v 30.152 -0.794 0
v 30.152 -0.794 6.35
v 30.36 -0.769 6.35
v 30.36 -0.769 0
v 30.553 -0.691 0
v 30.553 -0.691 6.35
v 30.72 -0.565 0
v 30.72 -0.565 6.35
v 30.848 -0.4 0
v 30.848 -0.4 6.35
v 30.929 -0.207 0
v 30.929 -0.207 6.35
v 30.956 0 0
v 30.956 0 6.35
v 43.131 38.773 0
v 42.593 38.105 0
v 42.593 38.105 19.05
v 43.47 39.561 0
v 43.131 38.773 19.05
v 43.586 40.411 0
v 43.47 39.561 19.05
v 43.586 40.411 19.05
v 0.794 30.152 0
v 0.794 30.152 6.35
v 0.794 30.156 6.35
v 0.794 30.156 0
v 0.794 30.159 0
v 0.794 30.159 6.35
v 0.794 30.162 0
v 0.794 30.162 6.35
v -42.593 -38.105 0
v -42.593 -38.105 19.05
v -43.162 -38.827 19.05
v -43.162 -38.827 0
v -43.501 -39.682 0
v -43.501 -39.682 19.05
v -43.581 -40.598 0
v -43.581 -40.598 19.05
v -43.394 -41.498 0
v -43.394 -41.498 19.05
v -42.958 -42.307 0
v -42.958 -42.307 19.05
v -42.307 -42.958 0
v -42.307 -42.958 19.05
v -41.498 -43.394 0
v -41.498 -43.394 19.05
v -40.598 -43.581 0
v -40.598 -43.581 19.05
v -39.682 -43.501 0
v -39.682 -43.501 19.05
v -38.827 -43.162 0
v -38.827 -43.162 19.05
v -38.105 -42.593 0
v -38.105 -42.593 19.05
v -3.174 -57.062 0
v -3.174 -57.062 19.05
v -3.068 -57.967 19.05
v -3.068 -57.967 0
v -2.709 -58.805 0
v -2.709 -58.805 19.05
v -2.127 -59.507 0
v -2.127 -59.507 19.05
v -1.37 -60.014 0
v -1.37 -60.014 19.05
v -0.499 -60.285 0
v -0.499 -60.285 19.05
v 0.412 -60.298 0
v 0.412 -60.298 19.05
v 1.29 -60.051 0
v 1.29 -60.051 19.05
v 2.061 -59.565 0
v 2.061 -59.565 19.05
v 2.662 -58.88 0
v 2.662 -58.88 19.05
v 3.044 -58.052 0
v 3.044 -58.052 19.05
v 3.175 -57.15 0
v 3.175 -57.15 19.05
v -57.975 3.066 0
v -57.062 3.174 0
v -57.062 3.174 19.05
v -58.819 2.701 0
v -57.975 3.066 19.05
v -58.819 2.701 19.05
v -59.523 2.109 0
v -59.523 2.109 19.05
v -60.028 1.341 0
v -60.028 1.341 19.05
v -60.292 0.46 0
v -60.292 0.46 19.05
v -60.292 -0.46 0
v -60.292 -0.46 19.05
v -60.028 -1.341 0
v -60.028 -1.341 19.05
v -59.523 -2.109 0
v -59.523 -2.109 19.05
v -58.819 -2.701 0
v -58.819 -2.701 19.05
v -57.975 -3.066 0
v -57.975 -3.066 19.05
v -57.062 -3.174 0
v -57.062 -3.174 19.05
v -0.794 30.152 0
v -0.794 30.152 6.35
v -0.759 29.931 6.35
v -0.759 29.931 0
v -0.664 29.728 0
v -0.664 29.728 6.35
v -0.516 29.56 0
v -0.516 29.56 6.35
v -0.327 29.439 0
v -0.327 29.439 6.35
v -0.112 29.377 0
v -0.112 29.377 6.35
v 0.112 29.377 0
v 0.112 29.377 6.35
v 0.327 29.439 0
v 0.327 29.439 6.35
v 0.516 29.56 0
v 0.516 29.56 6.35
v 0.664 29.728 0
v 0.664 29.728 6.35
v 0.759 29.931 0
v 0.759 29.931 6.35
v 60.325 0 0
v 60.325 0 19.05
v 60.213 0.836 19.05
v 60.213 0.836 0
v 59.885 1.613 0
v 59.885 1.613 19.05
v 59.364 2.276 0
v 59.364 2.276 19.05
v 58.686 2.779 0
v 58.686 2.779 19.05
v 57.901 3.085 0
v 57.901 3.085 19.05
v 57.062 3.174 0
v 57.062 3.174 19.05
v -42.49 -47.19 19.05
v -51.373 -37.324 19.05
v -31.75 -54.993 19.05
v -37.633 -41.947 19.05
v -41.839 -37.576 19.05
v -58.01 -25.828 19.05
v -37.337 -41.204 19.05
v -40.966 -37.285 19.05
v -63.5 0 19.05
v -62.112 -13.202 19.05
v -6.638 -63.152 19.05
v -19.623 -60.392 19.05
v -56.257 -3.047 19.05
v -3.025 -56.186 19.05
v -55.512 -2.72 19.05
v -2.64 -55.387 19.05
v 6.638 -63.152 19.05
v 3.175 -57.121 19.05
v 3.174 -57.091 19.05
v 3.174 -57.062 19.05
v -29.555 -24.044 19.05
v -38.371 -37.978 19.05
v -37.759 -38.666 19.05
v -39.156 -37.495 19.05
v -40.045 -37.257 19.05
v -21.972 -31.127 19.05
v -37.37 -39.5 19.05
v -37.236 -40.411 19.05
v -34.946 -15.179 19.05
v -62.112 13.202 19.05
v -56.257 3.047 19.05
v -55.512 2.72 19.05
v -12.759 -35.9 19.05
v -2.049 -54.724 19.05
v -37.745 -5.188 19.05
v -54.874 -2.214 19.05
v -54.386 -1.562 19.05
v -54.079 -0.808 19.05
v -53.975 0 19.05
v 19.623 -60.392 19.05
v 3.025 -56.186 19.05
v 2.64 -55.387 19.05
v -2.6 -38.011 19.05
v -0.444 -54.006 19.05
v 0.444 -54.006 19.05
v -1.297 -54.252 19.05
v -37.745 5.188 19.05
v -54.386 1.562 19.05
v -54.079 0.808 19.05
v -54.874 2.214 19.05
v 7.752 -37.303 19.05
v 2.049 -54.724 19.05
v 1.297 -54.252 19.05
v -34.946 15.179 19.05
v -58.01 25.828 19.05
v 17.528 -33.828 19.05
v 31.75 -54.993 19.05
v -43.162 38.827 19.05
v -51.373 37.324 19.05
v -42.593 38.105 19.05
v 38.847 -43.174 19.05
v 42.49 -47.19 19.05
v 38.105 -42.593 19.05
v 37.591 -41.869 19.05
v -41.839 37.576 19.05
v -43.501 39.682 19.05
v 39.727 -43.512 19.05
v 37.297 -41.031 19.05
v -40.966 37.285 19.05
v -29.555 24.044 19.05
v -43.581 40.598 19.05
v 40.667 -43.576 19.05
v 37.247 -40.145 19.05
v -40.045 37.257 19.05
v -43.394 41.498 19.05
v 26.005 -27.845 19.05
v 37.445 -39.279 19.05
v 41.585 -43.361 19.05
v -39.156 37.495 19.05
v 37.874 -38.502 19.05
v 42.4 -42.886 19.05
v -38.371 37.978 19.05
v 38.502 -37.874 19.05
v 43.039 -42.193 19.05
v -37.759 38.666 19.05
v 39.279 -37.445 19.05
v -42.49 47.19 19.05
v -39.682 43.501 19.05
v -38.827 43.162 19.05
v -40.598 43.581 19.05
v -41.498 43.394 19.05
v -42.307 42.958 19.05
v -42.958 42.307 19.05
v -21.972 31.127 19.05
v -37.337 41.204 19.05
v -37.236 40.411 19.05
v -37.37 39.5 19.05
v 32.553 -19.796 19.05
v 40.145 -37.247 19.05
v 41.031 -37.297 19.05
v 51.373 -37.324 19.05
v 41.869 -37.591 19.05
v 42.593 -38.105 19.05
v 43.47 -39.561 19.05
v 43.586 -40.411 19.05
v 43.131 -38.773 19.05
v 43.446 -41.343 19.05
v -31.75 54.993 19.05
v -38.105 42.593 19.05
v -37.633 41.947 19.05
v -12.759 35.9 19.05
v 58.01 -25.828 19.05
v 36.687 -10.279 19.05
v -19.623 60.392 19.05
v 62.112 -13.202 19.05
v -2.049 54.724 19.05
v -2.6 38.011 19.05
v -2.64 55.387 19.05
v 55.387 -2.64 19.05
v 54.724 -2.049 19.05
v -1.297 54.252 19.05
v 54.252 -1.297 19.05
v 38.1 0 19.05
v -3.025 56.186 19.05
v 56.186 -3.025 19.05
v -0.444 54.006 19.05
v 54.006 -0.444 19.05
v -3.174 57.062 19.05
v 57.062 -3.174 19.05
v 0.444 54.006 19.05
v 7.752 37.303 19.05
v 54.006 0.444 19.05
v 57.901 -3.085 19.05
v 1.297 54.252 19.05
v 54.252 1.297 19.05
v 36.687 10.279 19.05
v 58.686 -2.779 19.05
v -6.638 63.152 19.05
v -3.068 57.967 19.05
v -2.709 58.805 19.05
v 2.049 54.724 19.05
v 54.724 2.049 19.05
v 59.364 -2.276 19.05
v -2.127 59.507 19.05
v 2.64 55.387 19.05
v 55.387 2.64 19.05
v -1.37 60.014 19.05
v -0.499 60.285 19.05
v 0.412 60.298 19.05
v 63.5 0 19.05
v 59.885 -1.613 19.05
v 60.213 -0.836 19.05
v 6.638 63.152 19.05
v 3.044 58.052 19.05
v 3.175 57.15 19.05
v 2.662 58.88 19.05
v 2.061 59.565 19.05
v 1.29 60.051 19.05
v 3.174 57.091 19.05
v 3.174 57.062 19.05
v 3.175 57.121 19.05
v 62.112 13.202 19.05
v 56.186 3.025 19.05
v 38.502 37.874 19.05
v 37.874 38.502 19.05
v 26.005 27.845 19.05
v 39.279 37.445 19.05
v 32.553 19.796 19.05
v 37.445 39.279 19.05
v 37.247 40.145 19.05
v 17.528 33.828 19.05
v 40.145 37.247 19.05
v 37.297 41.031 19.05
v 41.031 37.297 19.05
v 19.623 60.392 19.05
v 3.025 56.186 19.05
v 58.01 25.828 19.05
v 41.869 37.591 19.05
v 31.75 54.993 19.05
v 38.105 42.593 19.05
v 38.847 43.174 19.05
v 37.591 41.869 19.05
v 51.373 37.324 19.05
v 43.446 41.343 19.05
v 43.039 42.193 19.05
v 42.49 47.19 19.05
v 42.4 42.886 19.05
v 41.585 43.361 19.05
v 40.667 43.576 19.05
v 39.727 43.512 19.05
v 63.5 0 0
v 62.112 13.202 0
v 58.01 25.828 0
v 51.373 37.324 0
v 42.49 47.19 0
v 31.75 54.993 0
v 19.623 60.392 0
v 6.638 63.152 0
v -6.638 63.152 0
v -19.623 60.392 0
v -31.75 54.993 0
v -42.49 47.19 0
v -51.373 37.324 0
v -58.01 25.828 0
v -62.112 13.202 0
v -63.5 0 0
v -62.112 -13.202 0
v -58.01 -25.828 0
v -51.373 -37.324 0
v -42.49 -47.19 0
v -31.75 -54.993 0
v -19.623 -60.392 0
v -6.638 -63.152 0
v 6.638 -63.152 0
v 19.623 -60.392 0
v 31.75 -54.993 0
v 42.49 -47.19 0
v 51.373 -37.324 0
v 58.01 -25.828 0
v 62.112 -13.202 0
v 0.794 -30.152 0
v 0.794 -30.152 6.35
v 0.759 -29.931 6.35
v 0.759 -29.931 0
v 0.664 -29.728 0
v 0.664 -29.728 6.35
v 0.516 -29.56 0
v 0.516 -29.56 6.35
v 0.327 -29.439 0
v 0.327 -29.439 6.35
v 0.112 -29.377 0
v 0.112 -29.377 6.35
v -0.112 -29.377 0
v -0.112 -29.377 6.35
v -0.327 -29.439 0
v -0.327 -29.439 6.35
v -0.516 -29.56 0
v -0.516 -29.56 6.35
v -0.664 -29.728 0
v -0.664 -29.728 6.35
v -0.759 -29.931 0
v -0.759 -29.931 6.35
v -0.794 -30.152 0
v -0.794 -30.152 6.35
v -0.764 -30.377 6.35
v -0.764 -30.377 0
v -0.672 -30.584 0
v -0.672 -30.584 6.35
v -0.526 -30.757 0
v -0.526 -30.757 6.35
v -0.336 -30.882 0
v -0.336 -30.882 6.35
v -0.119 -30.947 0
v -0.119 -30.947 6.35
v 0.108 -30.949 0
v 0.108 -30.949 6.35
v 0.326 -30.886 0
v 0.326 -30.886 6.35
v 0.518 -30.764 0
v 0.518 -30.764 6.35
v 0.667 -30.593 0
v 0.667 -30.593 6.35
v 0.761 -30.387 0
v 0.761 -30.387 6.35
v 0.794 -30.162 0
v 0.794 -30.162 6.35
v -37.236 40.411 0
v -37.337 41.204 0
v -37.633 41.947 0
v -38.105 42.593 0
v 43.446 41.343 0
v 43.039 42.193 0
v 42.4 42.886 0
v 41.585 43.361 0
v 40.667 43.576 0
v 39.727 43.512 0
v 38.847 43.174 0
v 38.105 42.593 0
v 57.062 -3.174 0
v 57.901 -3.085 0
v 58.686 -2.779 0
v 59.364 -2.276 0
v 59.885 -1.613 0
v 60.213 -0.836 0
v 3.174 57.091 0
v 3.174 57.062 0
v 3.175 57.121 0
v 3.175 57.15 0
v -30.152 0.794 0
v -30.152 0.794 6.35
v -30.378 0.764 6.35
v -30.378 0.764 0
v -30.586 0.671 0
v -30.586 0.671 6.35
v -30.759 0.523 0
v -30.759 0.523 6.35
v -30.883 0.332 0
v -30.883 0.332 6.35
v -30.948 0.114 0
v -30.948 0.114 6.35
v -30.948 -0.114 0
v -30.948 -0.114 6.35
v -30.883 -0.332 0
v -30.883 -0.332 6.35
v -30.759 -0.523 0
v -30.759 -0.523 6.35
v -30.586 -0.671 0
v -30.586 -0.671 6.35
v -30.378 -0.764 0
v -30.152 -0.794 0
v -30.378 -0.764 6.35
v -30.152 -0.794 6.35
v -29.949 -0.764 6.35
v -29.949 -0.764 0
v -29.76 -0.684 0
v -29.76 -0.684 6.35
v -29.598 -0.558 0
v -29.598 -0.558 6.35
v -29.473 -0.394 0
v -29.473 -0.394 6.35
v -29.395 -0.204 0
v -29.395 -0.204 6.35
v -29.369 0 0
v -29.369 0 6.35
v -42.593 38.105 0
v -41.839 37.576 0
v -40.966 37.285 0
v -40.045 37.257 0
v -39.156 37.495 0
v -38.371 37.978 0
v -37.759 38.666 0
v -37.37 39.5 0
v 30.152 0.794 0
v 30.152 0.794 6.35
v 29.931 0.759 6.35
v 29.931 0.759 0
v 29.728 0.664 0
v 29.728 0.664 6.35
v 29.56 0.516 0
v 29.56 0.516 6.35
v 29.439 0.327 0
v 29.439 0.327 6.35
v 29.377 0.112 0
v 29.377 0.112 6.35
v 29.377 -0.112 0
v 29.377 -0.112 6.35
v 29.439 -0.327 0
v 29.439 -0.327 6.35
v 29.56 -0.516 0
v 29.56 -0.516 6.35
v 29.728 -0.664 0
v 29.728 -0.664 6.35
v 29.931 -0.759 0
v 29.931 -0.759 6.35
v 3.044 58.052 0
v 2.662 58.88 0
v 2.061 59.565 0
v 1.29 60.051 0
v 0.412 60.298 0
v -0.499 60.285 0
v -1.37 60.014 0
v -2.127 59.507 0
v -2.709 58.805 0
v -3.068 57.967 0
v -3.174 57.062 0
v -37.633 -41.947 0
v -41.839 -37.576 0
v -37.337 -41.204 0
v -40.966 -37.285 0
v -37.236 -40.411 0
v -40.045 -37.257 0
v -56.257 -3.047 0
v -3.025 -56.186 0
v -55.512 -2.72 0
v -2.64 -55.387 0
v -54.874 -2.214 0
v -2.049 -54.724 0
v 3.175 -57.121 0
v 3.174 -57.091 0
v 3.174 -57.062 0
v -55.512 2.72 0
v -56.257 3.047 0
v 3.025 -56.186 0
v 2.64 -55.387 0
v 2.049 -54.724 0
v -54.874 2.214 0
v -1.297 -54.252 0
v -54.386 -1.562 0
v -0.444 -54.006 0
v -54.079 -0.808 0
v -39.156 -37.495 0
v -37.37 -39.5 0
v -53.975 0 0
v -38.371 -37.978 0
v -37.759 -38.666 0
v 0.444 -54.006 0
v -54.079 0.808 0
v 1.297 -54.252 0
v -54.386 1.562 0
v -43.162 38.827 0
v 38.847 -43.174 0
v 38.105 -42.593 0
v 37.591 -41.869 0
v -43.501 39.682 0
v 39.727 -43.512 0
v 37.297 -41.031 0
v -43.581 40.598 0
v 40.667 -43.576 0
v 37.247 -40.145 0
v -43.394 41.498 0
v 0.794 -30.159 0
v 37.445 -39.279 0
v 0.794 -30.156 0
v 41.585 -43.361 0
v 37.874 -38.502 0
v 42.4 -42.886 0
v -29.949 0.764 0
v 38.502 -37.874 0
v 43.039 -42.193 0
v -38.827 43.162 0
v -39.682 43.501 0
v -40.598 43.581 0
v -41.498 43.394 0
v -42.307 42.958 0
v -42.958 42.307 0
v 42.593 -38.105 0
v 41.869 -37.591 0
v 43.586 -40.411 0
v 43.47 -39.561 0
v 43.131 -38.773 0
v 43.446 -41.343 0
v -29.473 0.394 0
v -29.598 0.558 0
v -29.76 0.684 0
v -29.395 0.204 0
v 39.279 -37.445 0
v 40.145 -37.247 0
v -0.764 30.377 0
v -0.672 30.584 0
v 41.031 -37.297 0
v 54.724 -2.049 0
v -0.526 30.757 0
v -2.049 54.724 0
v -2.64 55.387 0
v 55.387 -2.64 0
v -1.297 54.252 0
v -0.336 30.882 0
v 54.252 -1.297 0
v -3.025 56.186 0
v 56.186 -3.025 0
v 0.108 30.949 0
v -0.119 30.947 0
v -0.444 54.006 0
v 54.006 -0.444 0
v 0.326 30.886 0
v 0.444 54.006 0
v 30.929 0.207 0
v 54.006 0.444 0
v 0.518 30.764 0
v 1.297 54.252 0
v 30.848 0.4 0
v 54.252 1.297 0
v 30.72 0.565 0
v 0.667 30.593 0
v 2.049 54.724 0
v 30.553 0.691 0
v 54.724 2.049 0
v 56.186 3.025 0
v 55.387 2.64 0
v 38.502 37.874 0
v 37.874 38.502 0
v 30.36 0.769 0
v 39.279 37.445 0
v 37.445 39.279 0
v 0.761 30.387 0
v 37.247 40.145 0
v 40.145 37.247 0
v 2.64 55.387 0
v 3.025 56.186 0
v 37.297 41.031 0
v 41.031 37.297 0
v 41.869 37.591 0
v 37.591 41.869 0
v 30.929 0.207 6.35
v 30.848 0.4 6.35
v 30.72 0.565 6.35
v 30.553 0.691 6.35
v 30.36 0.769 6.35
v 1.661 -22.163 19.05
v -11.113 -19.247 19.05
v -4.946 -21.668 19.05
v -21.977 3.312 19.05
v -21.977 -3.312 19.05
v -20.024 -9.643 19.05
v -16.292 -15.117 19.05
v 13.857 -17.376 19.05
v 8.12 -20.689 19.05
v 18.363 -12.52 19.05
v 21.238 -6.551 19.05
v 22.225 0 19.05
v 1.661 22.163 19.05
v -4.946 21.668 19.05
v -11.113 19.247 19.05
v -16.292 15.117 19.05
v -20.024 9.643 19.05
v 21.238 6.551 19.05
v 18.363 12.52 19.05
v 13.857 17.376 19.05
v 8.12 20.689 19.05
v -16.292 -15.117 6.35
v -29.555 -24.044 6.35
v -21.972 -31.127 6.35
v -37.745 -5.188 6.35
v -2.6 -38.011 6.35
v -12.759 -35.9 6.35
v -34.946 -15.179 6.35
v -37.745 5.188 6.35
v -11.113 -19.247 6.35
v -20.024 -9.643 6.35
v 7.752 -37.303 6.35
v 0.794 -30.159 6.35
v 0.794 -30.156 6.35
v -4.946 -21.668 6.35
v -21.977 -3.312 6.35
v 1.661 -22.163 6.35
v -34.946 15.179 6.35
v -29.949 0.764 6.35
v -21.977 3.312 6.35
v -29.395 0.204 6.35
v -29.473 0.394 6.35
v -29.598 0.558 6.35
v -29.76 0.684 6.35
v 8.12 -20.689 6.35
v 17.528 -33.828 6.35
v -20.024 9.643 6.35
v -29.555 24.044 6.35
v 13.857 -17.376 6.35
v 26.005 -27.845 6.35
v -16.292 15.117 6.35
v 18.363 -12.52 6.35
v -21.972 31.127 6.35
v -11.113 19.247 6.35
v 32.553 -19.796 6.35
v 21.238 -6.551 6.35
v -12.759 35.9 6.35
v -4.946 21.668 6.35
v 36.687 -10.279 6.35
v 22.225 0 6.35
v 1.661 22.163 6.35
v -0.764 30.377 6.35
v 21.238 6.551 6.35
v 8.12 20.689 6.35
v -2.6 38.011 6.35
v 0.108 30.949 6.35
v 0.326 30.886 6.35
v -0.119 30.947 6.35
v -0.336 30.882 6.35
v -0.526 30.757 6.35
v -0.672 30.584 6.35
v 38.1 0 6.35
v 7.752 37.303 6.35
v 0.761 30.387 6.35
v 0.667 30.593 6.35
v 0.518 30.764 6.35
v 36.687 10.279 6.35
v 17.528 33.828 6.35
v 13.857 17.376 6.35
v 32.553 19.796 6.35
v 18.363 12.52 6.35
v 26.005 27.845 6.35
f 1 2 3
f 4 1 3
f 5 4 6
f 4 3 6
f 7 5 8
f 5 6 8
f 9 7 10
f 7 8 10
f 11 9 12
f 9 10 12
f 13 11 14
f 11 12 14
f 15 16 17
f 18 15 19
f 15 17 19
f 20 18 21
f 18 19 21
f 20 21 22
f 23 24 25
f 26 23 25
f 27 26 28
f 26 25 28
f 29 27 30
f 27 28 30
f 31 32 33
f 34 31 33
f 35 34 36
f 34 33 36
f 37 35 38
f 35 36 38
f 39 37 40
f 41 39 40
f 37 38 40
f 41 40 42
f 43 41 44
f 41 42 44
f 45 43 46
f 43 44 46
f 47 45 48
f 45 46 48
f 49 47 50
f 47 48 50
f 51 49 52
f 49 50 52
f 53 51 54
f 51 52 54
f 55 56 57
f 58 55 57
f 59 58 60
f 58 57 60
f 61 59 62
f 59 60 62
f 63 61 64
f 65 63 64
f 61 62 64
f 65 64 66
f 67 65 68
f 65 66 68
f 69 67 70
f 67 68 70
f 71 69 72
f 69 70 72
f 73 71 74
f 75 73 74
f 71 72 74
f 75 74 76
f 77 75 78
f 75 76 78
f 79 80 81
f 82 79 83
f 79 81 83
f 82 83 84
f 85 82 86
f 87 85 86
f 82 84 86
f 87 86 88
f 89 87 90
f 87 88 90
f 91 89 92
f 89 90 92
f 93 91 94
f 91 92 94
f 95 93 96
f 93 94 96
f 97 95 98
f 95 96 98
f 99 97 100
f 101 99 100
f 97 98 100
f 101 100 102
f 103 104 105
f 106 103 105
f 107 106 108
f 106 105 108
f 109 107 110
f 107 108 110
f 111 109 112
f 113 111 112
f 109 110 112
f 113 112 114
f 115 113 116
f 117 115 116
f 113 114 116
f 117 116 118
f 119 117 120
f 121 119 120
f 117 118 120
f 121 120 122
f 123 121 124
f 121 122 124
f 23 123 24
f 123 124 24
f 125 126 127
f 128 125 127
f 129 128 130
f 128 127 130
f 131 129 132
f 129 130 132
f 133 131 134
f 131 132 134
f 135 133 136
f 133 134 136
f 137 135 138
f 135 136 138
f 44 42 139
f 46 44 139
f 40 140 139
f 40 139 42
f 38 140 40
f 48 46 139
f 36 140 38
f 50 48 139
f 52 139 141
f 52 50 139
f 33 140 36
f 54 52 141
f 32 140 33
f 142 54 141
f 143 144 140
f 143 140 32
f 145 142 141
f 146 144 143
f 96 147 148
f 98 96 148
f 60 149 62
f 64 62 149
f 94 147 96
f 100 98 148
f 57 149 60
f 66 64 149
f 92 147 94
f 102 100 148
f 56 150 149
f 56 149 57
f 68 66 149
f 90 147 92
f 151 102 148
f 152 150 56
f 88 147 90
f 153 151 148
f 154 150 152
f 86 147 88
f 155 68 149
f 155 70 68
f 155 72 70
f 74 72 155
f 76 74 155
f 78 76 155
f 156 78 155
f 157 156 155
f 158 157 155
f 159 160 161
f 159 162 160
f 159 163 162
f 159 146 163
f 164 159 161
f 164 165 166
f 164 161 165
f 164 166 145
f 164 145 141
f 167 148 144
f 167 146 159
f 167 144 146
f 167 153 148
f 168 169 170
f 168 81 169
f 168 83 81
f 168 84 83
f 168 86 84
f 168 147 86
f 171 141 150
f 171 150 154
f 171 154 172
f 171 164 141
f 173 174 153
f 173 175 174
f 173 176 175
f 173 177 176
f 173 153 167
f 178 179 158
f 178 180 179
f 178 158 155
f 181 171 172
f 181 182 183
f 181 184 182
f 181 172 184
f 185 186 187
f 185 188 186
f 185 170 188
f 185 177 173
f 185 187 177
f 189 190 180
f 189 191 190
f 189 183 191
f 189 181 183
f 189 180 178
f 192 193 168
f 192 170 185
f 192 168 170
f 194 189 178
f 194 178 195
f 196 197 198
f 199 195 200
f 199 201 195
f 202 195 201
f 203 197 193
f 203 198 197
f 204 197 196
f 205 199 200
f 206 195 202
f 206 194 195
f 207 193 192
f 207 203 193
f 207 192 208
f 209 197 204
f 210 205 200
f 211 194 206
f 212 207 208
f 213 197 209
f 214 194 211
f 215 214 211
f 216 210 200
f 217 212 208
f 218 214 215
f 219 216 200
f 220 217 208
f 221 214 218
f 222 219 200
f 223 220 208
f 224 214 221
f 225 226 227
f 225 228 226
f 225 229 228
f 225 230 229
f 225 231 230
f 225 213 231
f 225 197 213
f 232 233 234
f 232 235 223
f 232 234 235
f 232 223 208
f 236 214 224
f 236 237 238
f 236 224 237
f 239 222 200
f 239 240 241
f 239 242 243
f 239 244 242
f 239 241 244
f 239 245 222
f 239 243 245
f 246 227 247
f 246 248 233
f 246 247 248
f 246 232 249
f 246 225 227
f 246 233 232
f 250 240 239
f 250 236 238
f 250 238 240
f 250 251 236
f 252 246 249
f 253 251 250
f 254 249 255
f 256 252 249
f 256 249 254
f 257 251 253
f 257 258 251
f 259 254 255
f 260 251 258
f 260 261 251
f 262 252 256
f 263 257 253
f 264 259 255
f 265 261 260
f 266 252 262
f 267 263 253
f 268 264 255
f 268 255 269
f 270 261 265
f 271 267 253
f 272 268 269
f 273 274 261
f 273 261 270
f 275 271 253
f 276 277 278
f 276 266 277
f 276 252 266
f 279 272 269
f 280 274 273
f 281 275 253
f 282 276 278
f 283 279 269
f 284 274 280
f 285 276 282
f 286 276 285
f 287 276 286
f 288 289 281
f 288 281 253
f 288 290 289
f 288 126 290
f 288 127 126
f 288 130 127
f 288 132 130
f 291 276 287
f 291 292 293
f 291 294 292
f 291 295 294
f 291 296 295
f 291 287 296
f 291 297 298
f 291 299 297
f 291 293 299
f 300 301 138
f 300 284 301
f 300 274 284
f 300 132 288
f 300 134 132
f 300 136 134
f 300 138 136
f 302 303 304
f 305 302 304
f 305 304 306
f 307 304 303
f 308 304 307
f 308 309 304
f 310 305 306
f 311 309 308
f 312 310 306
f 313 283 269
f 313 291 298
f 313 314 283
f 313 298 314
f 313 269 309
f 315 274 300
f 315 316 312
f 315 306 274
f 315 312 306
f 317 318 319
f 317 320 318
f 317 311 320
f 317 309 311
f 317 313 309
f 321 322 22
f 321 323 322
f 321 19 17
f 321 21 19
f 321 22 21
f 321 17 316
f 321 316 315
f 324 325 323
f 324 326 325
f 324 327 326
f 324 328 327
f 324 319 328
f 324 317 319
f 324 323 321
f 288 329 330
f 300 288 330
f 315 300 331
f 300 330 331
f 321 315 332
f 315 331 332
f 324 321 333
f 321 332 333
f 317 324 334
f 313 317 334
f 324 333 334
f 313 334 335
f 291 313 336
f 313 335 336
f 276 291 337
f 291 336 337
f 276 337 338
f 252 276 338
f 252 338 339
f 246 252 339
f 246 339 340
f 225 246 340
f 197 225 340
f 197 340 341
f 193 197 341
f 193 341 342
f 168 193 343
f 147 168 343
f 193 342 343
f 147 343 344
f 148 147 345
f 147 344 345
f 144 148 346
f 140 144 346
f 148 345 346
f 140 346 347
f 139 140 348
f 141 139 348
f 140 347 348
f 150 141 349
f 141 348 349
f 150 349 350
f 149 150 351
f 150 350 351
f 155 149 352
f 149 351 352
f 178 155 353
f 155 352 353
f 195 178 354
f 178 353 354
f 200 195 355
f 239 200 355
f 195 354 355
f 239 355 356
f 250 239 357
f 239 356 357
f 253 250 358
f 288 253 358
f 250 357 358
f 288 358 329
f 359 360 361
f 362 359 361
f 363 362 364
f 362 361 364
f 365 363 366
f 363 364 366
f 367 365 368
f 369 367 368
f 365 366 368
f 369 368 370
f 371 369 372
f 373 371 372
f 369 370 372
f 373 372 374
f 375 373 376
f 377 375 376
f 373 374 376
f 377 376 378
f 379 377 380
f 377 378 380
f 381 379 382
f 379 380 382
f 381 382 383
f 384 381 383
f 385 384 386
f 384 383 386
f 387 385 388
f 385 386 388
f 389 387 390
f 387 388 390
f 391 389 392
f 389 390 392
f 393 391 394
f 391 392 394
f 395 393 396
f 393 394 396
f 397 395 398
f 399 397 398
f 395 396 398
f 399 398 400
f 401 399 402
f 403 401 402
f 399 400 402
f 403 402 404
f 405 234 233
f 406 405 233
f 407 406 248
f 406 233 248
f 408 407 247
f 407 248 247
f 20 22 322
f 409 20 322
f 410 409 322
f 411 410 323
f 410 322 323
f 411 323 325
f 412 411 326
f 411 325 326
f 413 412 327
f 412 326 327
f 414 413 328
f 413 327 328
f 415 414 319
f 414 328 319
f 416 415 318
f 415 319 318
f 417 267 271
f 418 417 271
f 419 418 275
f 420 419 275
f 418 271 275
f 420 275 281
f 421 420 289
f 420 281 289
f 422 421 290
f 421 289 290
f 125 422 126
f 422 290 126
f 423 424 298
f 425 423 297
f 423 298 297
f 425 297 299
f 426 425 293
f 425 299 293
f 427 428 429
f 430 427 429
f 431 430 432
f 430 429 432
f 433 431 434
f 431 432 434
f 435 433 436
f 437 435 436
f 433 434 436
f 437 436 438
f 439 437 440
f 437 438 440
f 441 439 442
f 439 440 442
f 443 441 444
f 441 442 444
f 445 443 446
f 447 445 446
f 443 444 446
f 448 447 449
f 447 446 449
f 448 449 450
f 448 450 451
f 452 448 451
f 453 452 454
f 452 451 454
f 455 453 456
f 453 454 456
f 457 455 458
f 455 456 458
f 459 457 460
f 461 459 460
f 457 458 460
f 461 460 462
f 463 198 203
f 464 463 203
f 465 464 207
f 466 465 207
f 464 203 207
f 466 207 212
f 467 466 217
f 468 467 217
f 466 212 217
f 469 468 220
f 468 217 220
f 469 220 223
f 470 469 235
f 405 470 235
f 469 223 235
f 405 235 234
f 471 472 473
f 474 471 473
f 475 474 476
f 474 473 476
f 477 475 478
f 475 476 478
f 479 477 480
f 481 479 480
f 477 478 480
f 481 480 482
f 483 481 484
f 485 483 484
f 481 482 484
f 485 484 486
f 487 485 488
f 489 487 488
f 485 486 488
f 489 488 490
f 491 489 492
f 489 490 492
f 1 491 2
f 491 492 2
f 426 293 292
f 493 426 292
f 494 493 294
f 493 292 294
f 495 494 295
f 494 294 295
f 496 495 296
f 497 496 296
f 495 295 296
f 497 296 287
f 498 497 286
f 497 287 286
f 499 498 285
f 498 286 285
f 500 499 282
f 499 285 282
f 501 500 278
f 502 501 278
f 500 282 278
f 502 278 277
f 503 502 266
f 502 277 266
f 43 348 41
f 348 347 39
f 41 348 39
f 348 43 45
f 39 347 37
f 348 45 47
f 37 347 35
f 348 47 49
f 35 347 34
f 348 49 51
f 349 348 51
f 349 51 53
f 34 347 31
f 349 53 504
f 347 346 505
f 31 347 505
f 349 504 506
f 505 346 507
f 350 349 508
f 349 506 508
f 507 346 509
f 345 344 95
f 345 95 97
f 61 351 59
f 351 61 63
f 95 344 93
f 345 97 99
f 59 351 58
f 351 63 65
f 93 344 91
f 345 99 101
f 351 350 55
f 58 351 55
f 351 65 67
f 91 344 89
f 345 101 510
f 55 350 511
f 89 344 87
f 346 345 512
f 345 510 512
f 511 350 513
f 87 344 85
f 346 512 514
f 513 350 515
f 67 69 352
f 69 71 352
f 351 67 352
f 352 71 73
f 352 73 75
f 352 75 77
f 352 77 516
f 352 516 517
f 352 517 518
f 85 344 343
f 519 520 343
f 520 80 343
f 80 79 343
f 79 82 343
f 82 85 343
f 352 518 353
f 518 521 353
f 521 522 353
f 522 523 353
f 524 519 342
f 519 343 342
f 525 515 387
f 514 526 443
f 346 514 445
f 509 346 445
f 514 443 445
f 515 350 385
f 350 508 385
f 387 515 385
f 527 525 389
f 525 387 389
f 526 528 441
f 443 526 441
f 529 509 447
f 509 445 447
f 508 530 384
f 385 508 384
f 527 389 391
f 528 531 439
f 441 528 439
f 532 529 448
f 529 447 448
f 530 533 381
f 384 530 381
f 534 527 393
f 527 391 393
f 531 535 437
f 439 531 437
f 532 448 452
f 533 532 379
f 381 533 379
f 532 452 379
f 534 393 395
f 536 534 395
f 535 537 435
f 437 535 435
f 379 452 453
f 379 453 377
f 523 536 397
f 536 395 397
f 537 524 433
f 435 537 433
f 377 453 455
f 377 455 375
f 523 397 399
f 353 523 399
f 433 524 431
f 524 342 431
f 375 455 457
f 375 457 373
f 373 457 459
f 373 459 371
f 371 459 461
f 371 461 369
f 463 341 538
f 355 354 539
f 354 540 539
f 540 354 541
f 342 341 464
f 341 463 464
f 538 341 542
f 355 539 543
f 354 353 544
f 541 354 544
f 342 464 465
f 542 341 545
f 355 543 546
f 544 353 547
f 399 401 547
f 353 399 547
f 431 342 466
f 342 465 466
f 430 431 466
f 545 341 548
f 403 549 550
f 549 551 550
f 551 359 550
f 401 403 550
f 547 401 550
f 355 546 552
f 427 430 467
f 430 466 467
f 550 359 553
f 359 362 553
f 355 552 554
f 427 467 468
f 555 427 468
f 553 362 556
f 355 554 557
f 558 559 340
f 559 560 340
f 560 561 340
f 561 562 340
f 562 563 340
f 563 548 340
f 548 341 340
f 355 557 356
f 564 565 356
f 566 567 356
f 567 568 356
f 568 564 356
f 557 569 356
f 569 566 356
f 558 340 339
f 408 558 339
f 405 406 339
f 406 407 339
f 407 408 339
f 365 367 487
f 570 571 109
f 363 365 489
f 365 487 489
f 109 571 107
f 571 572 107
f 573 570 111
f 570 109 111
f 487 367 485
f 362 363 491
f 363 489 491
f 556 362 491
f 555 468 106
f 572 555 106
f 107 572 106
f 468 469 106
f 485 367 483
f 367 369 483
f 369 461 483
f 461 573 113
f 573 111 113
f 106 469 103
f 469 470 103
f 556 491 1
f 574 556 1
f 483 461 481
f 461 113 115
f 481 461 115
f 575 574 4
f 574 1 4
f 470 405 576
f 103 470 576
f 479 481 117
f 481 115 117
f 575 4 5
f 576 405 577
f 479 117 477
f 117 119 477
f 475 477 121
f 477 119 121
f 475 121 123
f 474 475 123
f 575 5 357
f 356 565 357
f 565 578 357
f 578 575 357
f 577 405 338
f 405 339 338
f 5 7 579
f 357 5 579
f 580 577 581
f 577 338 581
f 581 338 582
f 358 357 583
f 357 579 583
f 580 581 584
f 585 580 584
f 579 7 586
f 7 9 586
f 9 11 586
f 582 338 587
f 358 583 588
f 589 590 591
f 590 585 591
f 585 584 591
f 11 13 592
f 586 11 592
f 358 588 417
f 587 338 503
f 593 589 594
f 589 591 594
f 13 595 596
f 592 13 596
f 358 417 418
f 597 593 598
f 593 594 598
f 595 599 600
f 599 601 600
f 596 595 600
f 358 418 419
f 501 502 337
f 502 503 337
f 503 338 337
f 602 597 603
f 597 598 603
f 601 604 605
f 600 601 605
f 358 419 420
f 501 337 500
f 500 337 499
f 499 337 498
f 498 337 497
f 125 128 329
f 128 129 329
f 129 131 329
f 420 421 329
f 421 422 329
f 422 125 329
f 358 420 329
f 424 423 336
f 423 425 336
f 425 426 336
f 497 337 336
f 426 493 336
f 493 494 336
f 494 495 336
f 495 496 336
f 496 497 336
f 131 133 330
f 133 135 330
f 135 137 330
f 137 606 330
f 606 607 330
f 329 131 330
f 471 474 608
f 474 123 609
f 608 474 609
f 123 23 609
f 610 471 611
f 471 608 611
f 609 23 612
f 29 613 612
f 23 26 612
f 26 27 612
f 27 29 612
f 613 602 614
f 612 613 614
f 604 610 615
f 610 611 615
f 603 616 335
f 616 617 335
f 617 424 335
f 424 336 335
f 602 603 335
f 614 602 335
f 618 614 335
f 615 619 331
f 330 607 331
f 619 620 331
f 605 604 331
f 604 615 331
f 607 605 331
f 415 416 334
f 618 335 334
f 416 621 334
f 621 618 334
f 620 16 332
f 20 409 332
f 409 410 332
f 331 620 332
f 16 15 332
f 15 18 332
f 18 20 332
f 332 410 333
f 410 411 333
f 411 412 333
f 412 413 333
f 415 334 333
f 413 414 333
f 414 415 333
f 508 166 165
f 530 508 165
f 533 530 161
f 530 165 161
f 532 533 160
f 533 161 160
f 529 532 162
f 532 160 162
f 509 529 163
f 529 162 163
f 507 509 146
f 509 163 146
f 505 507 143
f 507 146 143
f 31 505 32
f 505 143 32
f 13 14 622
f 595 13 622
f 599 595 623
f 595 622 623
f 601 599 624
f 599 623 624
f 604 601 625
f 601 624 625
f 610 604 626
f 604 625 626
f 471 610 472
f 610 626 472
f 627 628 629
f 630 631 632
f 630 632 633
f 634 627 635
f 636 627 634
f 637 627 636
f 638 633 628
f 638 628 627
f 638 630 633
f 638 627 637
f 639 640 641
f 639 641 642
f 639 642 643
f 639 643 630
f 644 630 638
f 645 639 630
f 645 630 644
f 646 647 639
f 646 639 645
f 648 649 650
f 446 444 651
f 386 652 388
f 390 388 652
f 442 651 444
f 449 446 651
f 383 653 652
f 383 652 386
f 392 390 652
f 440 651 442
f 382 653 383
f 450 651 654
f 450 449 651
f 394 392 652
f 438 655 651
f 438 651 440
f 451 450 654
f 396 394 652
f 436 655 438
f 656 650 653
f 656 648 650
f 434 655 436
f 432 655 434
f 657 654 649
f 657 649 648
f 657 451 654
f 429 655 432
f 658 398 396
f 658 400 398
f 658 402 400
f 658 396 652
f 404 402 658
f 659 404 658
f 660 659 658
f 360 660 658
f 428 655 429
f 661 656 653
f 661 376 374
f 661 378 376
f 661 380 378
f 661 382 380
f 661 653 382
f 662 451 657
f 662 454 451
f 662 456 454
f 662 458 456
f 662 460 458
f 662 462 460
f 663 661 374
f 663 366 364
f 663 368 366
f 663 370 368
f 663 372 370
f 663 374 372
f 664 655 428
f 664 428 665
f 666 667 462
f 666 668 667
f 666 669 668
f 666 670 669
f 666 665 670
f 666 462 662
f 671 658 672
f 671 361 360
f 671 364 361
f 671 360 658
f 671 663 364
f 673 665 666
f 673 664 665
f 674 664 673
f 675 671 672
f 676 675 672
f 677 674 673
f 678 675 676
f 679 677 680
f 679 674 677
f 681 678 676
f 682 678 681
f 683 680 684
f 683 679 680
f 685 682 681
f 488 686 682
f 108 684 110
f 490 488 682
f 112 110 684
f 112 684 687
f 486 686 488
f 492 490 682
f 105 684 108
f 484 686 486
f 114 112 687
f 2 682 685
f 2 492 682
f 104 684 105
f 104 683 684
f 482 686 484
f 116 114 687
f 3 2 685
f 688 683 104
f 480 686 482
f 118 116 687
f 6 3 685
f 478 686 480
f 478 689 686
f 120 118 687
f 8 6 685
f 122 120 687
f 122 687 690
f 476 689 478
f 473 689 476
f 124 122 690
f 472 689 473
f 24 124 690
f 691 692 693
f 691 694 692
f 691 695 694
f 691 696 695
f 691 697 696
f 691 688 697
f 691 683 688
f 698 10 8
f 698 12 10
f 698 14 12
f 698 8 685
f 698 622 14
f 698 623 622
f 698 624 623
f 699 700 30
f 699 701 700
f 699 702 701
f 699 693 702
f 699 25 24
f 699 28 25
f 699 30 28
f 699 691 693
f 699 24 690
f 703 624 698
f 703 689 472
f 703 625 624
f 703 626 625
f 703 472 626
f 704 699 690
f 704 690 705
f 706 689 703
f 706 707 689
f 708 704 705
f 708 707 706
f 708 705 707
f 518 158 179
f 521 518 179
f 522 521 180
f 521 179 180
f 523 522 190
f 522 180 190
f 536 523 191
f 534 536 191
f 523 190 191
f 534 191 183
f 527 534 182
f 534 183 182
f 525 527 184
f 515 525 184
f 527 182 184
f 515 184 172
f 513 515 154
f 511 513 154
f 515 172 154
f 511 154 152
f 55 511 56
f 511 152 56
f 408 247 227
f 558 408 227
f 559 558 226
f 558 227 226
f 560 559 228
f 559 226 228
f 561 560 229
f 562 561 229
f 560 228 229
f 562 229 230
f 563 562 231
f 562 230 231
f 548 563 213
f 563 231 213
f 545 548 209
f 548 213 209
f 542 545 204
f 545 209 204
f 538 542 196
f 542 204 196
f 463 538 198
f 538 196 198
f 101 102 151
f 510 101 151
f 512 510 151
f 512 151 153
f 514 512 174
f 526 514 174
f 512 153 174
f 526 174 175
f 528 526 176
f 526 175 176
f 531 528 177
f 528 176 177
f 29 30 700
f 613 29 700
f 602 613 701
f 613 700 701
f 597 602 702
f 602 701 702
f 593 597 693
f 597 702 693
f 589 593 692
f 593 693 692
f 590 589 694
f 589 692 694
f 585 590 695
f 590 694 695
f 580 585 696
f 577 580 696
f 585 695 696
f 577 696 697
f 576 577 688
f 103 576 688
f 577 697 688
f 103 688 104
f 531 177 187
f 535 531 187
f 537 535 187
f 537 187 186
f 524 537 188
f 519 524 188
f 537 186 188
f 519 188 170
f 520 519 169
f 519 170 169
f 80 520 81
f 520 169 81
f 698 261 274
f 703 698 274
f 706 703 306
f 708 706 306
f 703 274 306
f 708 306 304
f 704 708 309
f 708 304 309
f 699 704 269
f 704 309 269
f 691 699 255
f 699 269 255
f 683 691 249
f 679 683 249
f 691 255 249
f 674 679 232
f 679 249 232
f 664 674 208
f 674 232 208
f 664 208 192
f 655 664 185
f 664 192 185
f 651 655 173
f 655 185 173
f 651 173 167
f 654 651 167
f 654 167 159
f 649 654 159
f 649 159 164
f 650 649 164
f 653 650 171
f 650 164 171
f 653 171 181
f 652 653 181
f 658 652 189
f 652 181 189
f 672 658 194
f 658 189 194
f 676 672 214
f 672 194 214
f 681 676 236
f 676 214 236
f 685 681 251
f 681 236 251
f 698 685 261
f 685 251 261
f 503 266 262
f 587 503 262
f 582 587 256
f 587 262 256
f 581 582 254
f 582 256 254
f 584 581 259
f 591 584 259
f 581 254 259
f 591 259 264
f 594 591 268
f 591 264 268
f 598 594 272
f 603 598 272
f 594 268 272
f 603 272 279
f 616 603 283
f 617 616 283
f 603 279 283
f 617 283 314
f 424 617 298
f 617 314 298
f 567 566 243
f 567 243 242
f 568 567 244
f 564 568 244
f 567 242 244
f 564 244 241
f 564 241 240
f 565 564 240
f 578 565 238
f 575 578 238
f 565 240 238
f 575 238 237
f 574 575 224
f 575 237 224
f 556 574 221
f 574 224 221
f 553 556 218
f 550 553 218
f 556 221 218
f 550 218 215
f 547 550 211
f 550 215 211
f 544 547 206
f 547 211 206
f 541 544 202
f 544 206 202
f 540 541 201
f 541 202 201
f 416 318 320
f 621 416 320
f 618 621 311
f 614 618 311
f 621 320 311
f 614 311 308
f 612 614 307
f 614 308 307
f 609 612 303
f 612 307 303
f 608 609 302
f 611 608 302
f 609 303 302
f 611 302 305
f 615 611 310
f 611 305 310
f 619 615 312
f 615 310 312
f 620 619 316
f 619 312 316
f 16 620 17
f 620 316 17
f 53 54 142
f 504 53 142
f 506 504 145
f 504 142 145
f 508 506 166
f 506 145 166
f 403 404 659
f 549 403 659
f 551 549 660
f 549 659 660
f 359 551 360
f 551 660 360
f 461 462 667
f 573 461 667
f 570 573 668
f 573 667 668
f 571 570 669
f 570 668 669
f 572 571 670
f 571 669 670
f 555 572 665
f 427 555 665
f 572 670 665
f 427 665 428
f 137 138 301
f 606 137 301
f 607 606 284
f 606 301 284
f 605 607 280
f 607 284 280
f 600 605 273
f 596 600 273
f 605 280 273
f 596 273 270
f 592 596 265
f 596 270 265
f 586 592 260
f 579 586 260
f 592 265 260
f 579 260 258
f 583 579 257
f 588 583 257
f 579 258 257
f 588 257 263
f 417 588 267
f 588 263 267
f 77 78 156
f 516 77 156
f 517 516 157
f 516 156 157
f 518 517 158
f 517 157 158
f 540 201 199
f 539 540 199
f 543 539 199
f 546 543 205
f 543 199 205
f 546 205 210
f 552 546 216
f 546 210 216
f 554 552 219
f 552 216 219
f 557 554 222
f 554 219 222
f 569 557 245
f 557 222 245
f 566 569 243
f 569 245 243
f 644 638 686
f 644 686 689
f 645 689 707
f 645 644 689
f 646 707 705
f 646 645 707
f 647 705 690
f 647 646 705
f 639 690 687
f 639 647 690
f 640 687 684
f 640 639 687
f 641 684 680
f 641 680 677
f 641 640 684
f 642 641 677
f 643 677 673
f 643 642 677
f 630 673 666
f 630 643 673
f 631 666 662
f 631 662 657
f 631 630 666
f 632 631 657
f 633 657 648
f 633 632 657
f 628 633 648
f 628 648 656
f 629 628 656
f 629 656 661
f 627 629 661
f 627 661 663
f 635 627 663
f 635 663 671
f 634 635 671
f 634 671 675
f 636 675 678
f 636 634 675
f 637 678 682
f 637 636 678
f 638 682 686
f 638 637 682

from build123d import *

# Parameters (mm, degrees)
F0_R     = 63.5
F1_DEPTH = 19.05
F2_R     = 38.1
F2_R_2   = 22.225
F3_DEPTH = 12.7
F5_DEPTH = 25.4
F7_DEPTH = 25.4


with BuildPart() as f1:
    # F0 (on Top) → F1 (new body)
    with BuildSketch(Plane.XY):
        Circle(F0_R)
    extrude(amount=F1_DEPTH)

    # F2 (on face) → F3 (cut)
    with BuildSketch(Plane.XY.offset(19.05)):
        Circle(F2_R)
        Circle(F2_R_2, mode=Mode.SUBTRACT)
    extrude(amount=-F3_DEPTH, mode=Mode.SUBTRACT)

    # F4 (on face) → F5 (cut)
    with BuildSketch(Plane.XY.offset(19.05)):
        with BuildLine():
            ThreePointArc((-53.975, 0), (-54.873968, 2.213663), (-57.061806, 3.173775))
            ThreePointArc((-57.061806, 3.173775), (-60.325, 0), (-57.061806, -3.173775))
            ThreePointArc((-57.061806, -3.173775), (-54.873968, -2.213663), (-53.975, 0))
        make_face()
        with BuildLine():
            ThreePointArc((-38.104592, 42.592987), (-42.656217, 42.656217), (-42.592987, 38.104592))
            ThreePointArc((-42.592987, 38.104592), (-39.155505, 37.494995), (-37.236153, 40.411153))
            ThreePointArc((-37.236153, 40.411153), (-37.461241, 41.585311), (-38.104592, 42.592987))
        make_face()
        with BuildLine():
            ThreePointArc((3.175, 57.15), (-0.044101, 60.324694), (-3.173775, 57.061806))
            ThreePointArc((-3.173775, 57.061806), (0, 53.975), (3.173775, 57.061806))
            ThreePointArc((3.173775, 57.061806), (3.174694, 57.105899), (3.175, 57.15))
        make_face()
        with BuildLine():
            ThreePointArc((43.586153, 40.411153), (41.585311, 43.361064), (38.104592, 42.592987))
            ThreePointArc((38.104592, 42.592987), (38.166089, 38.166089), (42.592987, 38.104592))
            ThreePointArc((42.592987, 38.104592), (43.32731, 39.155505), (43.586153, 40.411153))
        make_face()
        with BuildLine():
            ThreePointArc((60.325, 0), (59.363663, 2.276032), (57.061806, 3.173775))
            ThreePointArc((57.061806, 3.173775), (53.975, 0), (57.061806, -3.173775))
            ThreePointArc((57.061806, -3.173775), (59.363663, -2.276032), (60.325, 0))
        make_face()
        with BuildLine():
            ThreePointArc((42.592987, -38.104592), (38.166089, -38.166089), (38.104592, -42.592987))
            ThreePointArc((38.104592, -42.592987), (41.585311, -43.361064), (43.586153, -40.411153))
            ThreePointArc((43.586153, -40.411153), (43.32731, -39.155505), (42.592987, -38.104592))
        make_face()
        with BuildLine():
            ThreePointArc((3.173775, -57.061806), (0, -53.975), (-3.173775, -57.061806))
            ThreePointArc((-3.173775, -57.061806), (-0.044101, -60.324694), (3.175, -57.15))
            ThreePointArc((3.175, -57.15), (3.174694, -57.105899), (3.173775, -57.061806))
        make_face()
        with BuildLine():
            ThreePointArc((-37.236153, -40.411153), (-39.155505, -37.494995), (-42.592987, -38.104592))
            ThreePointArc((-42.592987, -38.104592), (-42.656217, -42.656217), (-38.104592, -42.592987))
            ThreePointArc((-38.104592, -42.592987), (-37.461241, -41.585311), (-37.236153, -40.411153))
        make_face()
    extrude(amount=-F5_DEPTH, mode=Mode.SUBTRACT)

    # F6 (on face) → F7 (cut)
    with BuildSketch(Plane.XY.offset(6.35)):
        with BuildLine():
            ThreePointArc((-29.36875, 0), (-29.597554, 0.557561), (-30.152056, 0.793681))
            ThreePointArc((-30.152056, 0.793681), (-30.95625, 0), (-30.152056, -0.793681))
            ThreePointArc((-30.152056, -0.793681), (-29.597554, -0.557561), (-29.36875, 0))
        make_face()
        with BuildLine():
            ThreePointArc((0.793681, -30.152056), (0, -29.36875), (-0.793681, -30.152056))
            ThreePointArc((-0.793681, -30.152056), (-0.005222, -30.956233), (0.79375, -30.1625))
            ThreePointArc((0.79375, -30.1625), (0.793733, -30.157278), (0.793681, -30.152056))
        make_face()
        with BuildLine():
            ThreePointArc((30.95625, 0), (30.720061, 0.564946), (30.152056, 0.793681))
            ThreePointArc((30.152056, 0.793681), (29.36875, 0), (30.152056, -0.793681))
            ThreePointArc((30.152056, -0.793681), (30.720061, -0.564946), (30.95625, 0))
        make_face()
        with BuildLine():
            ThreePointArc((0.79375, 30.1625), (-0.005222, 30.956233), (-0.793681, 30.152056))
            ThreePointArc((-0.793681, 30.152056), (0, 29.36875), (0.793681, 30.152056))
            ThreePointArc((0.793681, 30.152056), (0.793733, 30.157278), (0.79375, 30.1625))
        make_face()
    extrude(amount=-F7_DEPTH, mode=Mode.SUBTRACT)


solid = f1.part
